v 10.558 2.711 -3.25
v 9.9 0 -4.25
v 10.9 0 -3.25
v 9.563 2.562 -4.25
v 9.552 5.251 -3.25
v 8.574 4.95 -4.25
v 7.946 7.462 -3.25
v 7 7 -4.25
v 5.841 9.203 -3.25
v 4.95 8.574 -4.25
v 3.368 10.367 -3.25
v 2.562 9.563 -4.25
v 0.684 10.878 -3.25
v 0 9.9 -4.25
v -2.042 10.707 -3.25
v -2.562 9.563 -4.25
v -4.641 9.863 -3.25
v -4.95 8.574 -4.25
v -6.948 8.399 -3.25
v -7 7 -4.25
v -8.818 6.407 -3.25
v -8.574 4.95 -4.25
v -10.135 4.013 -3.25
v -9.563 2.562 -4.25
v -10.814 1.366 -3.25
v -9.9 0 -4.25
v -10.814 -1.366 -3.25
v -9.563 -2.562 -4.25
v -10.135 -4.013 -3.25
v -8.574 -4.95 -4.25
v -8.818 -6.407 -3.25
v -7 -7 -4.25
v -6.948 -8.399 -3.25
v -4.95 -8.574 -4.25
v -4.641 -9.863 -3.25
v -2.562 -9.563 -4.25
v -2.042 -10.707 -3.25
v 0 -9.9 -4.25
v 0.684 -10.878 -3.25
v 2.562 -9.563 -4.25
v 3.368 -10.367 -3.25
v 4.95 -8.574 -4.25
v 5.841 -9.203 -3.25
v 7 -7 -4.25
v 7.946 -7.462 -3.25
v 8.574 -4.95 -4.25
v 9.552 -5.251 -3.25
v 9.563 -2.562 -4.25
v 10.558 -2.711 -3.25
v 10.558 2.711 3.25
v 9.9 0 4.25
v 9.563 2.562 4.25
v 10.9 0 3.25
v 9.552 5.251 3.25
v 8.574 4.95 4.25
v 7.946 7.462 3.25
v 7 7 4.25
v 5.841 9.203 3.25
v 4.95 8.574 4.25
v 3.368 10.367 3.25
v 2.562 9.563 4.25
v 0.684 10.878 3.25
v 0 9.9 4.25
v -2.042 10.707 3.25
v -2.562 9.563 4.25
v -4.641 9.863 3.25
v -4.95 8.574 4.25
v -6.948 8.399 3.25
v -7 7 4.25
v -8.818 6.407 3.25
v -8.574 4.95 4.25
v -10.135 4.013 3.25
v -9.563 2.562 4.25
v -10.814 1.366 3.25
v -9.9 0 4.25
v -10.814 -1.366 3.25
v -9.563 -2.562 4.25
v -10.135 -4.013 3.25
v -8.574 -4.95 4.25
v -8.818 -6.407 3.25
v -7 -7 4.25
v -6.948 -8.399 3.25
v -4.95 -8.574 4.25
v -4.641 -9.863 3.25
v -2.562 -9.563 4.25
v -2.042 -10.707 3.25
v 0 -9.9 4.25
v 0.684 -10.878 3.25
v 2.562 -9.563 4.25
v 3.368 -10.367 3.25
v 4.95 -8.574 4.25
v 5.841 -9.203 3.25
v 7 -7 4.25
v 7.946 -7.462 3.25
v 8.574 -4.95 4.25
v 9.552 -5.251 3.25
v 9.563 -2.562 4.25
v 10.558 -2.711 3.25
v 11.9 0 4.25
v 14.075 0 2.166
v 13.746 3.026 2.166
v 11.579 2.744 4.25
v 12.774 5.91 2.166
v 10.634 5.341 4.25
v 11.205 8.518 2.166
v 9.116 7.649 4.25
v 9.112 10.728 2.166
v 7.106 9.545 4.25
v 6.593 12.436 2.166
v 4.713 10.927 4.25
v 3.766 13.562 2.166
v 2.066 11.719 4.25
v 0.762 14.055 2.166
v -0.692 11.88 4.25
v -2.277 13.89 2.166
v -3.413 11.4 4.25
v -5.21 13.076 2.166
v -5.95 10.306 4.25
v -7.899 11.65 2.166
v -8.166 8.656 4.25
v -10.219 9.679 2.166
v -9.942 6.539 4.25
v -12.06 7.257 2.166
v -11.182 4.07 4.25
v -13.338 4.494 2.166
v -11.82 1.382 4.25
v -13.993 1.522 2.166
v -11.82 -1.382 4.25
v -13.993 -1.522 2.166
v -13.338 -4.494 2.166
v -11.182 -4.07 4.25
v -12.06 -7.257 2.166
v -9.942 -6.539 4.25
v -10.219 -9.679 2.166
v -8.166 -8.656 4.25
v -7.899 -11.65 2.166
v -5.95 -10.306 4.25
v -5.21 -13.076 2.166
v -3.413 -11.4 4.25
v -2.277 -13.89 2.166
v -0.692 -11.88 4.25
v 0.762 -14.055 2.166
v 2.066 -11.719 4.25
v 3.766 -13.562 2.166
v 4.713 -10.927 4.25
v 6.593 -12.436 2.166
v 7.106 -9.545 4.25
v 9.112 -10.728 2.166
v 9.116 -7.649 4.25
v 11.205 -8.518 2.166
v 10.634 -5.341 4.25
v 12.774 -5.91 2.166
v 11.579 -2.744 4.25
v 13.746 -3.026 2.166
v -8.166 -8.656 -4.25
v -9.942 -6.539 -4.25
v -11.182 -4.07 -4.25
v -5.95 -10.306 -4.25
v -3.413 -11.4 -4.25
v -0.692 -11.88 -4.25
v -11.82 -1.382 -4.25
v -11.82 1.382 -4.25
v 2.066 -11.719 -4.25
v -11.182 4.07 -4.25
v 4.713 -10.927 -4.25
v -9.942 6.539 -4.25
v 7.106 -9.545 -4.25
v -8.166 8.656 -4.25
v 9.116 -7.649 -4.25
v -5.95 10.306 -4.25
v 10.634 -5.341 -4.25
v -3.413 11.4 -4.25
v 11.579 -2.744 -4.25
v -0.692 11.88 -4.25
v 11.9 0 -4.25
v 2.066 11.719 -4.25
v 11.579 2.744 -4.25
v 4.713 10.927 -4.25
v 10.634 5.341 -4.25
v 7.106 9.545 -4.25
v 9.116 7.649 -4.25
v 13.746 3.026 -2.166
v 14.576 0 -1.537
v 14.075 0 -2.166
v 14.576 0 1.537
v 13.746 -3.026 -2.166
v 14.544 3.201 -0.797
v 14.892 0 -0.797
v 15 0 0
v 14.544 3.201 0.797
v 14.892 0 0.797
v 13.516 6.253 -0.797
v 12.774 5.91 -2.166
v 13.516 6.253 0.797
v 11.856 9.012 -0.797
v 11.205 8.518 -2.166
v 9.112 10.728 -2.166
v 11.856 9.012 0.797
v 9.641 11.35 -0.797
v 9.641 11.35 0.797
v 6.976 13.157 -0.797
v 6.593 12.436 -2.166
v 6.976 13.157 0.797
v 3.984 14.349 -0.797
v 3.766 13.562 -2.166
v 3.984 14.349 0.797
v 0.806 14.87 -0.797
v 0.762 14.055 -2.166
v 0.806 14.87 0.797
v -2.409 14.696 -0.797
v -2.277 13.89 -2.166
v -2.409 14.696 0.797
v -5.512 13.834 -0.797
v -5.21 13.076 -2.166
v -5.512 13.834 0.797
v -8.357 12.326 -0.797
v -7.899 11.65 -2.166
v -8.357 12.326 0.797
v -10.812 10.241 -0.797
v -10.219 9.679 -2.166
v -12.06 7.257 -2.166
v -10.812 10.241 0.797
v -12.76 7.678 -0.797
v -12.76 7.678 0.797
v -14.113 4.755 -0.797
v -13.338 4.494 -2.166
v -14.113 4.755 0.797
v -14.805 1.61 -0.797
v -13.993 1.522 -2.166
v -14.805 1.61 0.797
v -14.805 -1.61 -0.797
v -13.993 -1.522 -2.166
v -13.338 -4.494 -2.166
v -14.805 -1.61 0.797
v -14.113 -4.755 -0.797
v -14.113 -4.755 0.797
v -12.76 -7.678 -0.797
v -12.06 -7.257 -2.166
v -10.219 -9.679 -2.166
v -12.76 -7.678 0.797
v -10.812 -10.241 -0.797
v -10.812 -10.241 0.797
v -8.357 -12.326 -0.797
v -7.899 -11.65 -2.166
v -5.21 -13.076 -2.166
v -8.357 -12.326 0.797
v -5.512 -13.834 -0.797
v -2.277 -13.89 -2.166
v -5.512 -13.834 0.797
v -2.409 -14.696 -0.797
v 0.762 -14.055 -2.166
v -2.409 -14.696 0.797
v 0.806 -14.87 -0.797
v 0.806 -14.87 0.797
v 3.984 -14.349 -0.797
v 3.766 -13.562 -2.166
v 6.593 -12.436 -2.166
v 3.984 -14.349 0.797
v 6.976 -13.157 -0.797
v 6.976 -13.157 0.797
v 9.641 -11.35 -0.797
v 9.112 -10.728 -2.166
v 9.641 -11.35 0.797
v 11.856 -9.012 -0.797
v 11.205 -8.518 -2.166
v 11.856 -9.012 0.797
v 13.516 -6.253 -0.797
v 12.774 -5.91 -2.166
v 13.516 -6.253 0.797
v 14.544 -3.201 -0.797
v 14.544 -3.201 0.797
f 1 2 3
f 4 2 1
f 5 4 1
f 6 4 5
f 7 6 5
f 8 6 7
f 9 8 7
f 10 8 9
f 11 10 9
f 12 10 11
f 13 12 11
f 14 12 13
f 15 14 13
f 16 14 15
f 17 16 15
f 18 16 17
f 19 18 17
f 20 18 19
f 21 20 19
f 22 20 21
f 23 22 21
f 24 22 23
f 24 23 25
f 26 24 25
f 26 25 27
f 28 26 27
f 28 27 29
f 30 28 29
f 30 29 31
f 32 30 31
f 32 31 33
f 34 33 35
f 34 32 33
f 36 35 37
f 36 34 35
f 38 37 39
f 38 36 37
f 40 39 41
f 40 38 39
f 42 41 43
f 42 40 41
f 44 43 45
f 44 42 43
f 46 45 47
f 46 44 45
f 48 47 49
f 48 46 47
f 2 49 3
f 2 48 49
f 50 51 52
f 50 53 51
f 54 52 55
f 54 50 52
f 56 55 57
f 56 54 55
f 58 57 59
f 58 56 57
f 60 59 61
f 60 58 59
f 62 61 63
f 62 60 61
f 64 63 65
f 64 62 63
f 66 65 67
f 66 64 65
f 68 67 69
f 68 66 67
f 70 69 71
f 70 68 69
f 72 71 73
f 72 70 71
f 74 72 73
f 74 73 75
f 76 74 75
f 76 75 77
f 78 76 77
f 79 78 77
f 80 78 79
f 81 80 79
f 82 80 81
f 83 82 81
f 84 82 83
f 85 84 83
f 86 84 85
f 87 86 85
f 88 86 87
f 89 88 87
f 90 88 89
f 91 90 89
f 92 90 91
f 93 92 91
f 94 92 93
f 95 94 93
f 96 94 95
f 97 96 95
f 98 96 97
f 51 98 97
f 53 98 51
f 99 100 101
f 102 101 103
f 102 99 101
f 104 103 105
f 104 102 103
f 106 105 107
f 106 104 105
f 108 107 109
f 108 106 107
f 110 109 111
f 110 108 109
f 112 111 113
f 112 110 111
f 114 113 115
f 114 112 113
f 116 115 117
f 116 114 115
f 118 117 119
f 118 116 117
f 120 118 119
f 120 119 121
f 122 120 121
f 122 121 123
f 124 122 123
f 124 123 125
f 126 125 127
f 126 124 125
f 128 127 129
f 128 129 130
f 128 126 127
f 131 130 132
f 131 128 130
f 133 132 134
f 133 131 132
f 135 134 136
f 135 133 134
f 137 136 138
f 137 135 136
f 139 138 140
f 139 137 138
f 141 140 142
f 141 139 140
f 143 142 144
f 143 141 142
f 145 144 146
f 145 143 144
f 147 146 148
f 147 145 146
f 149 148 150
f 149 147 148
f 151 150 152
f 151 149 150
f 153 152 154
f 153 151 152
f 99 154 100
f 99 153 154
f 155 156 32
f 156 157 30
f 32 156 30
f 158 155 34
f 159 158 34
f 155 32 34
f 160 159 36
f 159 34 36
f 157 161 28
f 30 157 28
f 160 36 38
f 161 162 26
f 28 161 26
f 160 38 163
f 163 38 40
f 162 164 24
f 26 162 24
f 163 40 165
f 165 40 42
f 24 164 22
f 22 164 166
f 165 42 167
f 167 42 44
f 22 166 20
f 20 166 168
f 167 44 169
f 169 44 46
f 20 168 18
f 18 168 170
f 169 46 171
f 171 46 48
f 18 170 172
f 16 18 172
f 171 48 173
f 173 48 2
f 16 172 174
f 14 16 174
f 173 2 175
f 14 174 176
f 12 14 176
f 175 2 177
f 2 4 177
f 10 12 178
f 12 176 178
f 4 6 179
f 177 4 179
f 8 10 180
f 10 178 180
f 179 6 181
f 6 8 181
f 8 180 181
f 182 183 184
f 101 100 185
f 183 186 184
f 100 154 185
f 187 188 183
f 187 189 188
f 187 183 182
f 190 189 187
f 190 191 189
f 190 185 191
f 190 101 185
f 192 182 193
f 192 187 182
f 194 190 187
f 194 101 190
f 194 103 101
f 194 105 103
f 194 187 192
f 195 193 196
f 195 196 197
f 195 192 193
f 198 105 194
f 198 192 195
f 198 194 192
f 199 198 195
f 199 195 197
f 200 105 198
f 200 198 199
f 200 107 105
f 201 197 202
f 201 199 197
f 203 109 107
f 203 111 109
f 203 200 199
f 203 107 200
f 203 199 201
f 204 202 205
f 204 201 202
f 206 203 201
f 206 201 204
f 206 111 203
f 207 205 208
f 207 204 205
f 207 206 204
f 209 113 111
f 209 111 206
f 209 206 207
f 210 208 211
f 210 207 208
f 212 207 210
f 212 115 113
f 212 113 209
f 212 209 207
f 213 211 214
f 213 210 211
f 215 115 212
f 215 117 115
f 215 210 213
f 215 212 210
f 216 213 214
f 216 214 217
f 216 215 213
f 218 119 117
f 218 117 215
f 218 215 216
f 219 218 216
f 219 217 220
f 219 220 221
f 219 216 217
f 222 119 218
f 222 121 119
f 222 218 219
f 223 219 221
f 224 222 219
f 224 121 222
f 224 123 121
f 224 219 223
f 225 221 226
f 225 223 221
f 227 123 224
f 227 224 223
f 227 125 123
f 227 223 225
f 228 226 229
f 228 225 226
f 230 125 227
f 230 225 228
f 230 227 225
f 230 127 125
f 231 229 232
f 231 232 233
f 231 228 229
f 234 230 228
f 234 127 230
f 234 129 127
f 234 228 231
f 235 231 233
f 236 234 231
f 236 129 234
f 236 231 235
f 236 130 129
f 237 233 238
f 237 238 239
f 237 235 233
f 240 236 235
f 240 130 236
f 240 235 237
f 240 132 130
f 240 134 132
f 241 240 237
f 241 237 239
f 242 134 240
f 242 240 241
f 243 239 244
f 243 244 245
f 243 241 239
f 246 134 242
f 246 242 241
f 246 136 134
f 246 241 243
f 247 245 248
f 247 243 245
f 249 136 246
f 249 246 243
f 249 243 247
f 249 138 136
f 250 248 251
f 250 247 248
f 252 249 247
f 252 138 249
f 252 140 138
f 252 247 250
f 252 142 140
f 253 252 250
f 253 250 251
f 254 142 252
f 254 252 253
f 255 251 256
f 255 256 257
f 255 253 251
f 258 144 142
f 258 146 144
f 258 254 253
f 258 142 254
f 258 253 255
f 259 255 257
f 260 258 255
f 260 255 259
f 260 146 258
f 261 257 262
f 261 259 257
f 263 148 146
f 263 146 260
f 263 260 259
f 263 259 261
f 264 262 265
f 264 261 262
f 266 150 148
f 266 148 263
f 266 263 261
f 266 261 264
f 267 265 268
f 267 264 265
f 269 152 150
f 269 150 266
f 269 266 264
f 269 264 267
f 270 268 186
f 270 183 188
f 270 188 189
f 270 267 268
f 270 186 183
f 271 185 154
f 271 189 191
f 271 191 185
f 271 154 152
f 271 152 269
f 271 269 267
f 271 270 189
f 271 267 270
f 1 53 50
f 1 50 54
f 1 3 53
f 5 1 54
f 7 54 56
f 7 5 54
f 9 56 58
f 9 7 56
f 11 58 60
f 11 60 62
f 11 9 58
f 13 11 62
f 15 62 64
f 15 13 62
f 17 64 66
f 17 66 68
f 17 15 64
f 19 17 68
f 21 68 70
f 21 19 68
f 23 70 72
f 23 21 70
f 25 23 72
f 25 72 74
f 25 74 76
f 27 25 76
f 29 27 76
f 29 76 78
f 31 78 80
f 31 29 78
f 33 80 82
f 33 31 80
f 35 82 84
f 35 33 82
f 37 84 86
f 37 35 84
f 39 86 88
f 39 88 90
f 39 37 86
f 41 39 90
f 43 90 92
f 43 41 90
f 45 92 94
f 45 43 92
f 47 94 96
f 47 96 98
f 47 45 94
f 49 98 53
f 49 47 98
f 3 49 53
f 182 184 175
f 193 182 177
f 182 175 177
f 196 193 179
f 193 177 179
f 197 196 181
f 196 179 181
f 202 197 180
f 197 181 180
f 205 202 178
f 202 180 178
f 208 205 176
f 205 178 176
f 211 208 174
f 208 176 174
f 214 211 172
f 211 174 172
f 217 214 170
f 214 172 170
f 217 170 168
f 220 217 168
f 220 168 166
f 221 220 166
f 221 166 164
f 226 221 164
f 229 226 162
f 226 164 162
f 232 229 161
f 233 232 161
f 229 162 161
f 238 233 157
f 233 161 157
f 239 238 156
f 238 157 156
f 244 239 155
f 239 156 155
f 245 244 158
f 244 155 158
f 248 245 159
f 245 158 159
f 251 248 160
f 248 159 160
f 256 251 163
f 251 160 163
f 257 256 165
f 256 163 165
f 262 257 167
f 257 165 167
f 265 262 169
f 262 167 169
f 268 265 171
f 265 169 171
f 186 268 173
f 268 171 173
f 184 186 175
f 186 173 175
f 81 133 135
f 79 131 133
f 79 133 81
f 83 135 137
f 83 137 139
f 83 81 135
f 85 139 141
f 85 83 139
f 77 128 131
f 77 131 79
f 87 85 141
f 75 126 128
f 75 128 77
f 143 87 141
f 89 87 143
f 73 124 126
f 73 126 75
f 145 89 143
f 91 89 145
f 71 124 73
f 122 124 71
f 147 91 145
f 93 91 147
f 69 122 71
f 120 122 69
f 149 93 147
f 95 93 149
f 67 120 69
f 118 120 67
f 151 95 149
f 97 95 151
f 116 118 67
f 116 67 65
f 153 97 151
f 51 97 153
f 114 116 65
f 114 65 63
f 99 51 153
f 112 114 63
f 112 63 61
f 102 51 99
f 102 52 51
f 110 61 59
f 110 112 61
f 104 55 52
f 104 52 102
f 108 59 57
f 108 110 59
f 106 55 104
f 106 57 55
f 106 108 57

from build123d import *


with BuildPart() as part:
    # Sketch → Revolution (revolve)
    with BuildSketch(Plane.XZ):
        with BuildLine():
            ThreePointArc((14.075183, -2.166475), (15, 0), (14.075183, 2.166475))
            Line((14.075183, 2.166475), (11.9, 4.25))
            Line((11.9, 4.25), (9.9, 4.25))
            Line((9.9, 4.25), (10.9, 3.25))
            Line((10.9, 0), (10.9, 3.25))
            Line((10.9, 0), (10.9, -3.25))
            Line((10.9, -3.25), (9.9, -4.25))
            Line((11.9, -4.25), (9.9, -4.25))
            Line((14.075183, -2.166475), (11.9, -4.25))
        make_face()
    revolve(axis=Axis((0, 0, 0), (0, 0, 1)))


solid = part.part
